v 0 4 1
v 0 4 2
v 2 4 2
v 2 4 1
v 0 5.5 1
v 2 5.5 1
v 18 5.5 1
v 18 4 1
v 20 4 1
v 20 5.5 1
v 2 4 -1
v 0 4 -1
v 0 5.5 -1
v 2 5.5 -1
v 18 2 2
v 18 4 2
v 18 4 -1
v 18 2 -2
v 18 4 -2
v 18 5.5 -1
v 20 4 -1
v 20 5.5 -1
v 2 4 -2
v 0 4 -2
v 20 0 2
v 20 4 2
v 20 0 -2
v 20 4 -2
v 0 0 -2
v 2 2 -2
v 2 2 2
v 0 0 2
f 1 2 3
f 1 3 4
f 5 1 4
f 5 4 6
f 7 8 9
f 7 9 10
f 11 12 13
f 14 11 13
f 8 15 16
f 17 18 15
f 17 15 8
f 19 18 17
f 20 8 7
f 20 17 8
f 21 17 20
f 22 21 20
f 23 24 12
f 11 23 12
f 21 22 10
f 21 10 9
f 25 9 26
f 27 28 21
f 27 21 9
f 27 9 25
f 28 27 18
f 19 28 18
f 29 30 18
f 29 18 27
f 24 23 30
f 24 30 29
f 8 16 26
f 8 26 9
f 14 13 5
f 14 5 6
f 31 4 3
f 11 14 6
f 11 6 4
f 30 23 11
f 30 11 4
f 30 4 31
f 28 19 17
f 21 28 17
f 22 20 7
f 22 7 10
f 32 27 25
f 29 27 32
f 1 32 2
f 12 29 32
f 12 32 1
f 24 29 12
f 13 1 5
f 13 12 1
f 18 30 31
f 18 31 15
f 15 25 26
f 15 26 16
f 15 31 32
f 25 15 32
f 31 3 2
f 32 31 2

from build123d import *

# Parameters (mm, degrees)
BOSS_EXTRUDE1_DEPTH      = 2
BOSS_EXTRUDE1_DEPTH_BACK = 2
SKETCH2_W                = 1
SKETCH2_H                = 1.5
CUT_EXTRUDE1_DEPTH       = 21.838665984


with BuildPart() as part:
    # Sketch1 → Boss-Extrude1 (new, two sides: drawn at the far end of the back side and taken through both)
    with BuildSketch(Plane.XY.offset(-BOSS_EXTRUDE1_DEPTH_BACK)):
        Polygon((2, 2), (18, 2), (18, 5.5), (20, 5.5), (20, 0), (0, 0), (0, 5.5), (2, 5.5), align=None)
    extrude(amount=BOSS_EXTRUDE1_DEPTH + BOSS_EXTRUDE1_DEPTH_BACK)

    # Sketch2 → Cut-Extrude1 (cut, symmetric)
    with BuildSketch(Plane.ZY):
        with Locations((-1.5, 4.75)):
            Rectangle(SKETCH2_W, SKETCH2_H)
    cut_extrude1 = extrude(amount=CUT_EXTRUDE1_DEPTH, both=True, mode=Mode.SUBTRACT)

    # Mirror1: Cut-Extrude1 across plane
    add(cut_extrude1.mirror(Plane.XY), mode=Mode.SUBTRACT)


solid = part.part
